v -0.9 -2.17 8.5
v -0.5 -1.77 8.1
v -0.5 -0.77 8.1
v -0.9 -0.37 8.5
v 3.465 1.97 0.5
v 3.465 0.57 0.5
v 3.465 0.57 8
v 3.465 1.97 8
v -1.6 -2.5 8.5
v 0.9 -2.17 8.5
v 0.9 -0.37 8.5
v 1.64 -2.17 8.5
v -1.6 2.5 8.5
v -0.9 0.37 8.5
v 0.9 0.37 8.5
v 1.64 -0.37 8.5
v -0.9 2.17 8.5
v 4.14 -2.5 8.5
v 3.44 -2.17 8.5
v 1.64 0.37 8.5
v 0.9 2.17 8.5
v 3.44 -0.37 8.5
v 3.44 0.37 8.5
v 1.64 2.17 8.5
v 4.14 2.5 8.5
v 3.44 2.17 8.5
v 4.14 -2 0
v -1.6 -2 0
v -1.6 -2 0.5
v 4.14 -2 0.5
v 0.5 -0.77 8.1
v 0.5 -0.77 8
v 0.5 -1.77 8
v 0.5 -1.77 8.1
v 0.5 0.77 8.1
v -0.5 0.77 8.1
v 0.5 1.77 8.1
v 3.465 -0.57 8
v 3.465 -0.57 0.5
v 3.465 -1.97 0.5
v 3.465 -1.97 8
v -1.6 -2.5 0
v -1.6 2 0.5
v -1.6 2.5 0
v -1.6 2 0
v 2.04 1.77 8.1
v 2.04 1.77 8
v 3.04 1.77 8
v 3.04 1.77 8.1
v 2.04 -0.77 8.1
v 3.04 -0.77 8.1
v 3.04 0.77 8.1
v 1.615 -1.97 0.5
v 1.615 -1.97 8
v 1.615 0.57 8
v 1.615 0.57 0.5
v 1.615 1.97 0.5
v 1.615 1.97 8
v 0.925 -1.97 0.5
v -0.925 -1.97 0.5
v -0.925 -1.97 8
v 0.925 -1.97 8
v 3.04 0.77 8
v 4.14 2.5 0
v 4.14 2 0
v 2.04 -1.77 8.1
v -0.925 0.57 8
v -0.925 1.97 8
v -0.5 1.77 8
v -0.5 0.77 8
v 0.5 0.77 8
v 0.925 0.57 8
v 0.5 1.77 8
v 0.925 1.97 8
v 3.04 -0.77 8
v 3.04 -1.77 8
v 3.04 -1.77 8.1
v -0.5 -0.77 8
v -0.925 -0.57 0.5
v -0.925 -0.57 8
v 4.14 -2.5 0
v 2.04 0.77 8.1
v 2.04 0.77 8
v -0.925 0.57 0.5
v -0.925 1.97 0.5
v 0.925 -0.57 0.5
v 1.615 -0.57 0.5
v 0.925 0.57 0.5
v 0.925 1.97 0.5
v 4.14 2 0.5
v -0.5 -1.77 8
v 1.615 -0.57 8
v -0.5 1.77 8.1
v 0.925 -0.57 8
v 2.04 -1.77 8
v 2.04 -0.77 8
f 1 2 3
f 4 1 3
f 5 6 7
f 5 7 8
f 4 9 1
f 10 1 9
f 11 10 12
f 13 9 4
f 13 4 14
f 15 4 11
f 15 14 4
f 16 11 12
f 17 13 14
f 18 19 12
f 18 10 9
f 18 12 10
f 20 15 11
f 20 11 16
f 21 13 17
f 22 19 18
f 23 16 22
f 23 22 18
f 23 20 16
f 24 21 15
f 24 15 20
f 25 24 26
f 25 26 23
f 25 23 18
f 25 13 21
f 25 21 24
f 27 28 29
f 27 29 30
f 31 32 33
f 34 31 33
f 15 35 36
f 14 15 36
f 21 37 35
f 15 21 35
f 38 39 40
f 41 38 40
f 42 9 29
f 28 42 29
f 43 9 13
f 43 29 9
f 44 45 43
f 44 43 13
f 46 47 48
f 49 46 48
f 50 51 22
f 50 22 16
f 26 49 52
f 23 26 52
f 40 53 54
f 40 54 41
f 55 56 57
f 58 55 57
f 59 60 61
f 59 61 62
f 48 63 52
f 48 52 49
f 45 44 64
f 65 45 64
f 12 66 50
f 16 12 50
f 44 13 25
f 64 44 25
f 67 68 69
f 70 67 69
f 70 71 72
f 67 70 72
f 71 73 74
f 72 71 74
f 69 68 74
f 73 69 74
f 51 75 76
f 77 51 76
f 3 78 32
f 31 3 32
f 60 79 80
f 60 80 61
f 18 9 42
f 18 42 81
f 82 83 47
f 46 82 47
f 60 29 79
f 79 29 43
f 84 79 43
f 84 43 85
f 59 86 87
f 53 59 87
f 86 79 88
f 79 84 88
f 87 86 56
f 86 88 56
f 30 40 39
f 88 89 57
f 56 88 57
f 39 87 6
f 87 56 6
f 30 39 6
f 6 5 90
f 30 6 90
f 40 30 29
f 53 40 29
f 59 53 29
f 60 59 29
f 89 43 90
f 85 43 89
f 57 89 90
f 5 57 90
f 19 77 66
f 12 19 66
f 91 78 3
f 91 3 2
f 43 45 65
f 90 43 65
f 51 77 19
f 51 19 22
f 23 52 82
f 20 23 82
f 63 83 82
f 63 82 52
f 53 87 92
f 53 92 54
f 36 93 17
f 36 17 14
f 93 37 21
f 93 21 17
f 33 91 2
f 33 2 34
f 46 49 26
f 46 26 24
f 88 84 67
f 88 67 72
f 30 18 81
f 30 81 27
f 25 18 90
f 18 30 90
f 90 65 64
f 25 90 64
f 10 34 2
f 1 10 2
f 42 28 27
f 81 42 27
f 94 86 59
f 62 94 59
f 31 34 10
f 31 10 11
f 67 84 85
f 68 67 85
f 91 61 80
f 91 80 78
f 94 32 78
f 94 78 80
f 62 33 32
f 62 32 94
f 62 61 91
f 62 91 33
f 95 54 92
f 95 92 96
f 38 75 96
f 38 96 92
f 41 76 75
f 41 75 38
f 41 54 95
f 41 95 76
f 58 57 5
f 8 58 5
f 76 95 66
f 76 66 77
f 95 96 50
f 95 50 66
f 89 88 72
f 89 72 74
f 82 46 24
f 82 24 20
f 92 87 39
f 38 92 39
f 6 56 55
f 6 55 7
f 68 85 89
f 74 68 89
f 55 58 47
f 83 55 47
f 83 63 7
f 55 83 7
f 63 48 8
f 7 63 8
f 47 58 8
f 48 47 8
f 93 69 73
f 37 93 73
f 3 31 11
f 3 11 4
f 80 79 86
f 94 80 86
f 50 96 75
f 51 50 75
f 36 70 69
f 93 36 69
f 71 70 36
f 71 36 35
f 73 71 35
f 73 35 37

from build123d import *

# Parameters (mm, degrees)
SKETCH001_W      = 1.85
SKETCH001_H      = 1.4
EXTRUDE001_DEPTH = 8
SKETCH002_W      = 1
SKETCH002_H      = 1
EXTRUDE002_DEPTH = 9
SKETCH013_W      = 4
SKETCH013_H      = 4
EXTRUDE013_DEPTH = 0.5
SKETCH012_W      = 3.2
SKETCH012_H      = 5
EXTRUDE012_DEPTH = 8.5
CHAMFER003_SIZE  = 0.4
ARRAY006_X_COUNT = 2
ARRAY006_X_PITCH = 2.54


with BuildPart() as extrude001:
    # Sketch001 → Extrude001 (new body)
    with BuildSketch(Plane.XY):
        Rectangle(SKETCH001_W, SKETCH001_H)
    extrude(amount=EXTRUDE001_DEPTH)


with BuildPart() as fusion006:
    # Sketch002 → Extrude002 (new body)
    with BuildSketch(Plane.XY):
        Rectangle(SKETCH002_W, SKETCH002_H)
    extrude(amount=EXTRUDE002_DEPTH)

    # Fusion006: union Extrude001
    add(extrude001.part)


with BuildPart() as fusion006_1:
    # Fusion006 placement: moved
    add(fusion006.part.moved(Location((0, 1.27, 0))))


with BuildPart() as part_mirroring003:
    # Part__Mirroring003: instance of Fusion006
    add(fusion006_1.part.mirror(Plane(origin=(0, 0, 0), x_dir=(1, 0, 0), z_dir=(0, 1, 0))))


with BuildPart() as fusion007:
    # Sketch013 → Extrude013 (new body)
    with BuildSketch(Plane.XY):
        Rectangle(SKETCH013_W, SKETCH013_H)
    extrude(amount=EXTRUDE013_DEPTH)

    # Fusion007: union Part__Mirroring003, Fusion006
    add(part_mirroring003.part)
    add(fusion006_1.part)


with BuildPart() as body003:
    # Sketch012 → Extrude012 (new body)
    with BuildSketch(Plane.XY):
        Rectangle(SKETCH012_W, SKETCH012_H)
    extrude(amount=EXTRUDE012_DEPTH)

    # Cut003: cut Fusion007
    add(fusion007.part, mode=Mode.SUBTRACT)

    # Chamfer003
    chamfer003_edges = [body003.edges().sort_by_distance(p)[0] for p in [
        (0, -0.77, 8.5),
        (-0.5, -1.27, 8.5),
        (0, -1.77, 8.5),
        (0.5, -1.27, 8.5),
        (0.5, 1.27, 8.5),
        (0, 1.77, 8.5),
        (-0.5, 1.27, 8.5),
        (0, 0.77, 8.5),
    ]]
    chamfer(chamfer003_edges, length=CHAMFER003_SIZE)

    # Array006 X: body003 ×2


with BuildPart() as body003_1:
    add(body003.part)
    with Locations(*[(i * ARRAY006_X_PITCH, 0, 0) for i in range(1, ARRAY006_X_COUNT)]):
        add(body003.part)


solid = body003_1.part
